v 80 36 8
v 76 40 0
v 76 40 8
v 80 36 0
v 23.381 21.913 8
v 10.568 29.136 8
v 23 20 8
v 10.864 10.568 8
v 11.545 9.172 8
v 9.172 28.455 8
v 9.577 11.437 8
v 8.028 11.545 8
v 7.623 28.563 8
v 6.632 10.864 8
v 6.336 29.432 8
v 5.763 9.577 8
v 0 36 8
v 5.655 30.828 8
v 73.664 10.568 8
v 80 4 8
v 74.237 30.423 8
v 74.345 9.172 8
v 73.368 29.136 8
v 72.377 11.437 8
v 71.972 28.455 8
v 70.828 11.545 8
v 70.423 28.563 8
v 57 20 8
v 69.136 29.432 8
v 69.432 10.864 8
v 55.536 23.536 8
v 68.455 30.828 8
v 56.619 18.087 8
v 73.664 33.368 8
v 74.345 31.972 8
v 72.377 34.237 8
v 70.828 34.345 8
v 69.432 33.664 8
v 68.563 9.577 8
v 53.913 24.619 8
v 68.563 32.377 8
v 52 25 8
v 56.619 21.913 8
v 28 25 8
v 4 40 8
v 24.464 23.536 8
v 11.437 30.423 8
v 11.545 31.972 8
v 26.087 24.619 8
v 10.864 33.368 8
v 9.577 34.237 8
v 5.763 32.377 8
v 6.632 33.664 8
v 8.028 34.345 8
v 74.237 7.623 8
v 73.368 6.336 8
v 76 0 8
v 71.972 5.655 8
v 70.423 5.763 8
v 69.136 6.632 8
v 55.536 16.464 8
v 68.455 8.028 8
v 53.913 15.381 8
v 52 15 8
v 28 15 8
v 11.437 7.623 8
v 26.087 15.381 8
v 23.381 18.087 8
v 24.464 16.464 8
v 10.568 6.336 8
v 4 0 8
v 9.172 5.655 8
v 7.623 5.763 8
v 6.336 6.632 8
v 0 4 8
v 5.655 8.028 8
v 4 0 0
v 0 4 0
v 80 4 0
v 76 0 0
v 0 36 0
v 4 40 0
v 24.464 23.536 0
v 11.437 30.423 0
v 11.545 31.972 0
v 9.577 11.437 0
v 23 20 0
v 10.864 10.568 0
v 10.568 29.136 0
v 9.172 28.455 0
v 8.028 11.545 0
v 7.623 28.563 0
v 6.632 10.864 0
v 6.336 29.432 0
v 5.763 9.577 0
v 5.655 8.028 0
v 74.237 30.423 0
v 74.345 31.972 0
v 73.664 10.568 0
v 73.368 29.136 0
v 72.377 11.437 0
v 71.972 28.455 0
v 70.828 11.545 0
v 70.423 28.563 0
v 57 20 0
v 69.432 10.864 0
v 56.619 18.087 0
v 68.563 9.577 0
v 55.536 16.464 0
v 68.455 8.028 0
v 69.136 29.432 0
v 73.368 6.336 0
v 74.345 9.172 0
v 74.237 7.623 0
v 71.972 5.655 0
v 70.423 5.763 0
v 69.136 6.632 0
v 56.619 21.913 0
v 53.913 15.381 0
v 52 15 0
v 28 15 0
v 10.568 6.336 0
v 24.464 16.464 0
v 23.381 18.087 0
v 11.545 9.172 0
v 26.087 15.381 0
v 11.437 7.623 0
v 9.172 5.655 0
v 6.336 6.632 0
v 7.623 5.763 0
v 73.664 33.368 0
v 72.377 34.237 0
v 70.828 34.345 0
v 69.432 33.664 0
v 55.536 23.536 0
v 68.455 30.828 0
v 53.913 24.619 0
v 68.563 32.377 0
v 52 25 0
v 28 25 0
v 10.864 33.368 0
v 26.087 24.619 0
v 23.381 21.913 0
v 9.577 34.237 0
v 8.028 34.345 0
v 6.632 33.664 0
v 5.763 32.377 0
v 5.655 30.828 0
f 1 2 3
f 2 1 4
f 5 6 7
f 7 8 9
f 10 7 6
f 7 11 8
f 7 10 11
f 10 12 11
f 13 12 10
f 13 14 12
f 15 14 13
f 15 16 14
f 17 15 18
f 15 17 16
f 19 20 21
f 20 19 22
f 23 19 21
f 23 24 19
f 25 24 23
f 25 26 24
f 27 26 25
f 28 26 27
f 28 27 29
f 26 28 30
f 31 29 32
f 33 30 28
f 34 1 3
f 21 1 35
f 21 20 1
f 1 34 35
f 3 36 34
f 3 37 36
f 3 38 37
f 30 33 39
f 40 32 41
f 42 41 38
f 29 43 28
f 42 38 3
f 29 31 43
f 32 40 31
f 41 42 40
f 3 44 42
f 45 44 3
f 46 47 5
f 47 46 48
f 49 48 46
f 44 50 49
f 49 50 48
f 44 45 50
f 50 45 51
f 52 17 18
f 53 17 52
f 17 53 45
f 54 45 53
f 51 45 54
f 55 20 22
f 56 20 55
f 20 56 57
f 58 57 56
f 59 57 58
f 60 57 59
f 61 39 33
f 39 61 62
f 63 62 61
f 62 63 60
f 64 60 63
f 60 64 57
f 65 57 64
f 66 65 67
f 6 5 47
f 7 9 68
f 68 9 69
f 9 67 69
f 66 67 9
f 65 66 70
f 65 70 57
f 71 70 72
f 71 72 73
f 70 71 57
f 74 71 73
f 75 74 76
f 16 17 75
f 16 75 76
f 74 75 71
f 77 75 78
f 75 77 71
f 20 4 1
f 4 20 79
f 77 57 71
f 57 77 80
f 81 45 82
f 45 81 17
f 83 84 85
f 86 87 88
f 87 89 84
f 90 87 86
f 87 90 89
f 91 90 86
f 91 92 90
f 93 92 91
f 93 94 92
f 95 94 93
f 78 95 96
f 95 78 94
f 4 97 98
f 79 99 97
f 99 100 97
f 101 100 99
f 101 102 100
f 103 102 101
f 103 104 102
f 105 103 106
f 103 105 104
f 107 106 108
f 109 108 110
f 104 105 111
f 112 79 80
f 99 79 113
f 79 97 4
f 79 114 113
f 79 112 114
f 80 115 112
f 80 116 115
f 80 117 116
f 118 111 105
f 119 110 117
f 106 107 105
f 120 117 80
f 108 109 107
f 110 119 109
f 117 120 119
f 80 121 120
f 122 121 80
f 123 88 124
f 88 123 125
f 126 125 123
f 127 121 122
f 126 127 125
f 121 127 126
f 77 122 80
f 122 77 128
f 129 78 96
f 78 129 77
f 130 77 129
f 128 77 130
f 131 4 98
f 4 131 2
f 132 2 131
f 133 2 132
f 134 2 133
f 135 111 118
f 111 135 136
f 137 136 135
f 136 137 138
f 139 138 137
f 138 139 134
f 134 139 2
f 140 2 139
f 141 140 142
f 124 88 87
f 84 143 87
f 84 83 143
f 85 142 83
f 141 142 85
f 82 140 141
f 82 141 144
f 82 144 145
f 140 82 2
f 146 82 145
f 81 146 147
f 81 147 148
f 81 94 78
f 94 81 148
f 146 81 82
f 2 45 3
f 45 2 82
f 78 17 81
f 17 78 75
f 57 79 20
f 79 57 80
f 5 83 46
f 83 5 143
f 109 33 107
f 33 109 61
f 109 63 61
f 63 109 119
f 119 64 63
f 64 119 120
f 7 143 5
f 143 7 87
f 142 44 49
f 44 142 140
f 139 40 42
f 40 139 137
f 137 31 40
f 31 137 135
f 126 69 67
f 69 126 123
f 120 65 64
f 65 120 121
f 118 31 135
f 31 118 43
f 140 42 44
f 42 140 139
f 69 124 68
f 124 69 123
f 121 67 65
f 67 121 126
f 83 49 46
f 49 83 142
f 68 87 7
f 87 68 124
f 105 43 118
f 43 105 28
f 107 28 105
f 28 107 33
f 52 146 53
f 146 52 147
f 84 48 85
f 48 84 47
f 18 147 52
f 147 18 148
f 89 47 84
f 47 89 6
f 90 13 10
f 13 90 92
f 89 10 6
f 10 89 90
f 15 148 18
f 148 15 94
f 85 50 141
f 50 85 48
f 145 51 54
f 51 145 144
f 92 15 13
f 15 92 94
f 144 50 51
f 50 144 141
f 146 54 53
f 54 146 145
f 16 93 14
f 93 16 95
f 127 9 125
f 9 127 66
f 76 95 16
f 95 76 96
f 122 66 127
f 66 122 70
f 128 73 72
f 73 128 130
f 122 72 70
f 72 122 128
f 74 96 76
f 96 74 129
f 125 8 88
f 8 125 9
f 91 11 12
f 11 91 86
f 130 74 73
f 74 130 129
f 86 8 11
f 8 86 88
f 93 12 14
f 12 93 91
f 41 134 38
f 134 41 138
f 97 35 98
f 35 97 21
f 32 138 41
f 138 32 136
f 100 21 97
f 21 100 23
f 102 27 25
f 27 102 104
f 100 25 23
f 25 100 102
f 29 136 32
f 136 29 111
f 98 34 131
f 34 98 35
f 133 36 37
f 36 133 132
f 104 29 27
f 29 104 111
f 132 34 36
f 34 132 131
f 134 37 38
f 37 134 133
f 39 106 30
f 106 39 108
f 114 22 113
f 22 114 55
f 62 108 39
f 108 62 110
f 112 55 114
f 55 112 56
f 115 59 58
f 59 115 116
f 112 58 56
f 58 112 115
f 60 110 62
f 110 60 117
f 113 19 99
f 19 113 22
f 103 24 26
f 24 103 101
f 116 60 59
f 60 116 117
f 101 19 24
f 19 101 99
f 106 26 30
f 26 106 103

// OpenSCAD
$fn = 32;

// ----------------------------------------------------------------------
// Bracket plate: slot plate 80 x 40
// ----------------------------------------------------------------------

// --- parameters (mm) ---
hole_r = 3;               // bolt hole radius
plate_t = 8;              // plate thickness, Z (extrusion height)
plate_l = 80;             // plate length
plate_w = 40;             // plate width
slot_l = 24;              // slot straight length
slot_r = 5;               // slot end radius

slot_len = slot_l + 2 * slot_r;
slot_w = 2 * slot_r;
hole_d2 = 2 * hole_r;

profile = [[4, 0], [76, 0], [80, 4], [80, 36], [76, 40], [4, 40], [0, 36], [0, 4]];  // primary outline, 8 points, counter clockwise
void_1 = [[52, 15], [53.913, 15.381], [55.536, 16.464], [56.619, 18.087], [57, 20], [56.619, 21.913], [55.536, 23.536], [53.913, 24.619], [52, 25], [28, 25], [26.087, 24.619], [24.464, 23.536], [23.381, 21.913], [23, 20], [23.381, 18.087], [24.464, 16.464], [26.087, 15.381], [28, 15]];  // grip slot, 18 points
void_2 = [[11.545, 31.972], [10.864, 33.368], [9.577, 34.237], [8.028, 34.345], [6.632, 33.664], [5.763, 32.377], [5.655, 30.828], [6.336, 29.432], [7.623, 28.563], [9.172, 28.455], [10.568, 29.136], [11.437, 30.423]];  // corner hole, 12 points
void_3 = [[11.545, 9.172], [10.864, 10.568], [9.577, 11.437], [8.028, 11.545], [6.632, 10.864], [5.763, 9.577], [5.655, 8.028], [6.336, 6.632], [7.623, 5.763], [9.172, 5.655], [10.568, 6.336], [11.437, 7.623]];  // corner hole, 12 points
void_4 = [[74.345, 31.972], [73.664, 33.368], [72.377, 34.237], [70.828, 34.345], [69.432, 33.664], [68.563, 32.377], [68.455, 30.828], [69.136, 29.432], [70.423, 28.563], [71.972, 28.455], [73.368, 29.136], [74.237, 30.423]];  // corner hole, 12 points
void_5 = [[74.345, 9.172], [73.664, 10.568], [72.377, 11.437], [70.828, 11.545], [69.432, 10.864], [68.563, 9.577], [68.455, 8.028], [69.136, 6.632], [70.423, 5.763], [71.972, 5.655], [73.368, 6.336], [74.237, 7.623]];  // corner hole, 12 points

// --- the one profile operation ---
difference() {
  linear_extrude(height = plate_t) polygon(points = profile);
  translate([0, 0, -1])
    linear_extrude(height = plate_t + 2) polygon(points = void_1);
  translate([0, 0, -1])
    linear_extrude(height = plate_t + 2) polygon(points = void_2);
  translate([0, 0, -1])
    linear_extrude(height = plate_t + 2) polygon(points = void_3);
  translate([0, 0, -1])
    linear_extrude(height = plate_t + 2) polygon(points = void_4);
  translate([0, 0, -1])
    linear_extrude(height = plate_t + 2) polygon(points = void_5);
}
